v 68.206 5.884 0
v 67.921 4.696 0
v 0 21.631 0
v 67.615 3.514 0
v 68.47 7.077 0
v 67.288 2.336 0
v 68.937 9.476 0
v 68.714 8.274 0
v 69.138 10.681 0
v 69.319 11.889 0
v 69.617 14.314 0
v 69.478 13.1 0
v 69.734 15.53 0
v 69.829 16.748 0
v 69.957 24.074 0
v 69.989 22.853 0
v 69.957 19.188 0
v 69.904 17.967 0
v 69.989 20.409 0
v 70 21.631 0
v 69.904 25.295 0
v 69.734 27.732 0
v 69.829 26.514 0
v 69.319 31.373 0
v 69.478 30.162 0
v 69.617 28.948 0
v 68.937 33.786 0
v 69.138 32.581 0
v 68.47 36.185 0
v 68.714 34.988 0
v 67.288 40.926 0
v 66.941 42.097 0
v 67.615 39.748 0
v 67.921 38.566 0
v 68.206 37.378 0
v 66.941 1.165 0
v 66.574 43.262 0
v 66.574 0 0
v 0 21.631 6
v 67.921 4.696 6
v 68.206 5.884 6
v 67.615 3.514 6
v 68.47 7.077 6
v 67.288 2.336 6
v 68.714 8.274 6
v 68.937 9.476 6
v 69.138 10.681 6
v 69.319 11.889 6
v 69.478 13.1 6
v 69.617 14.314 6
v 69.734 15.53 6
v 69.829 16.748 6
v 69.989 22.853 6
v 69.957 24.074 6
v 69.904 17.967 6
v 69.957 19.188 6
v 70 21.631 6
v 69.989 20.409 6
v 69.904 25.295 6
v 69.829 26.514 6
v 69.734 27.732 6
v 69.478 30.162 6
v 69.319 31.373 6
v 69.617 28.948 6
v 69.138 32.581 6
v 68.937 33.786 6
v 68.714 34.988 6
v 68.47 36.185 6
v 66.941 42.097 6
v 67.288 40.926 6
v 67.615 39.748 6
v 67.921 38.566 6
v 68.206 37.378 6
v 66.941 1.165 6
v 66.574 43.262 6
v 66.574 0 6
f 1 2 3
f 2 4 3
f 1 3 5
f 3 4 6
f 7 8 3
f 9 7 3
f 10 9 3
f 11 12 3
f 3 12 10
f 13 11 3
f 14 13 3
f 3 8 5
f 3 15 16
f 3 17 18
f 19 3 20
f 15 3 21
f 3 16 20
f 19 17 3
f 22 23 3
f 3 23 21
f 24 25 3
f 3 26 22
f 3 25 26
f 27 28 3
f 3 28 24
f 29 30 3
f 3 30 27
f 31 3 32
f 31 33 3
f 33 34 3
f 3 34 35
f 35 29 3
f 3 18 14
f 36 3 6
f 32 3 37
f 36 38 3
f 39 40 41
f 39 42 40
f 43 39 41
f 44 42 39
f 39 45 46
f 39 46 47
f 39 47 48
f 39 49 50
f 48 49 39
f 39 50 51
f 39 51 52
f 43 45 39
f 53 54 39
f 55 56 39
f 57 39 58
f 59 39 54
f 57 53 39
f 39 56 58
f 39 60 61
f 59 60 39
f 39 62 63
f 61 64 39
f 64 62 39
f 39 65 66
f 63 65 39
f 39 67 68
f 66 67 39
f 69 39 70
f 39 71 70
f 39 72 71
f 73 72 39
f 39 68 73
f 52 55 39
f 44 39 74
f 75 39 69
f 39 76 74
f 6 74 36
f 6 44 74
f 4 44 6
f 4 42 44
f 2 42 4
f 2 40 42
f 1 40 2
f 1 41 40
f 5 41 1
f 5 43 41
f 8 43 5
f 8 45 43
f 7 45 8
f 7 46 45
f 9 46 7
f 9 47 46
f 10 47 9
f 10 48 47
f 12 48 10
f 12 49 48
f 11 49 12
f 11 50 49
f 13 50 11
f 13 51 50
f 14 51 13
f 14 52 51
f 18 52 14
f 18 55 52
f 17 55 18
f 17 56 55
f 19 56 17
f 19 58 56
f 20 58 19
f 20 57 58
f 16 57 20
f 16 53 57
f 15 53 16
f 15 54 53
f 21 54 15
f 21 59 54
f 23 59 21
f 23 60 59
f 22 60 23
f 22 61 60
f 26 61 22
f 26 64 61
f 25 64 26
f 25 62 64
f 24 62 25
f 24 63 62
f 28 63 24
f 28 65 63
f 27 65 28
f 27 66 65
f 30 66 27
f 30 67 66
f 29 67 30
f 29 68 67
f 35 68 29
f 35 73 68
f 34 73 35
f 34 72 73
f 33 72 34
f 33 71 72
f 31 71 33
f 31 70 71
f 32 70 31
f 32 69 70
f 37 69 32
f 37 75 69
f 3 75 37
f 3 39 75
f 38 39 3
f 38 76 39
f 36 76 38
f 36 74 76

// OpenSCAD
$fn = 32;

// ----------------------------------------------------------------------
// Arc profile plate: sector, 38 points
// ----------------------------------------------------------------------

// --- parameters (mm) ---
sector_angle = 36;        // sector angle, degrees
sector_r = 70;            // outer radius
arc_step = 1;             // sampling step of the arc, degrees
plate_t = 6;              // plate thickness, Z

bbox_x = 2 * sector_r * sin(sector_angle / 2);  // chord of the sector
bbox_y = sector_r;  // depth of the sector (apex to arc)

profile = [[66.574, 0], [66.941, 1.165], [67.288, 2.336], [67.615, 3.514], [67.921, 4.696], [68.206, 5.884], [68.47, 7.077], [68.714, 8.274], [68.937, 9.476], [69.138, 10.681], [69.319, 11.889], [69.478, 13.1], [69.617, 14.314], [69.734, 15.53], [69.829, 16.748], [69.904, 17.967], [69.957, 19.188], [69.989, 20.409], [70, 21.631], [69.989, 22.853], [69.957, 24.074], [69.904, 25.295], [69.829, 26.514], [69.734, 27.732], [69.617, 28.948], [69.478, 30.162], [69.319, 31.373], [69.138, 32.581], [68.937, 33.786], [68.714, 34.988], [68.47, 36.185], [68.206, 37.378], [67.921, 38.566], [67.615, 39.748], [67.288, 40.926], [66.941, 42.097], [66.574, 43.262], [0, 21.631]];  // primary outline, 38 points, counter clockwise

// --- the one profile operation ---
linear_extrude(height = plate_t) polygon(points = profile);
